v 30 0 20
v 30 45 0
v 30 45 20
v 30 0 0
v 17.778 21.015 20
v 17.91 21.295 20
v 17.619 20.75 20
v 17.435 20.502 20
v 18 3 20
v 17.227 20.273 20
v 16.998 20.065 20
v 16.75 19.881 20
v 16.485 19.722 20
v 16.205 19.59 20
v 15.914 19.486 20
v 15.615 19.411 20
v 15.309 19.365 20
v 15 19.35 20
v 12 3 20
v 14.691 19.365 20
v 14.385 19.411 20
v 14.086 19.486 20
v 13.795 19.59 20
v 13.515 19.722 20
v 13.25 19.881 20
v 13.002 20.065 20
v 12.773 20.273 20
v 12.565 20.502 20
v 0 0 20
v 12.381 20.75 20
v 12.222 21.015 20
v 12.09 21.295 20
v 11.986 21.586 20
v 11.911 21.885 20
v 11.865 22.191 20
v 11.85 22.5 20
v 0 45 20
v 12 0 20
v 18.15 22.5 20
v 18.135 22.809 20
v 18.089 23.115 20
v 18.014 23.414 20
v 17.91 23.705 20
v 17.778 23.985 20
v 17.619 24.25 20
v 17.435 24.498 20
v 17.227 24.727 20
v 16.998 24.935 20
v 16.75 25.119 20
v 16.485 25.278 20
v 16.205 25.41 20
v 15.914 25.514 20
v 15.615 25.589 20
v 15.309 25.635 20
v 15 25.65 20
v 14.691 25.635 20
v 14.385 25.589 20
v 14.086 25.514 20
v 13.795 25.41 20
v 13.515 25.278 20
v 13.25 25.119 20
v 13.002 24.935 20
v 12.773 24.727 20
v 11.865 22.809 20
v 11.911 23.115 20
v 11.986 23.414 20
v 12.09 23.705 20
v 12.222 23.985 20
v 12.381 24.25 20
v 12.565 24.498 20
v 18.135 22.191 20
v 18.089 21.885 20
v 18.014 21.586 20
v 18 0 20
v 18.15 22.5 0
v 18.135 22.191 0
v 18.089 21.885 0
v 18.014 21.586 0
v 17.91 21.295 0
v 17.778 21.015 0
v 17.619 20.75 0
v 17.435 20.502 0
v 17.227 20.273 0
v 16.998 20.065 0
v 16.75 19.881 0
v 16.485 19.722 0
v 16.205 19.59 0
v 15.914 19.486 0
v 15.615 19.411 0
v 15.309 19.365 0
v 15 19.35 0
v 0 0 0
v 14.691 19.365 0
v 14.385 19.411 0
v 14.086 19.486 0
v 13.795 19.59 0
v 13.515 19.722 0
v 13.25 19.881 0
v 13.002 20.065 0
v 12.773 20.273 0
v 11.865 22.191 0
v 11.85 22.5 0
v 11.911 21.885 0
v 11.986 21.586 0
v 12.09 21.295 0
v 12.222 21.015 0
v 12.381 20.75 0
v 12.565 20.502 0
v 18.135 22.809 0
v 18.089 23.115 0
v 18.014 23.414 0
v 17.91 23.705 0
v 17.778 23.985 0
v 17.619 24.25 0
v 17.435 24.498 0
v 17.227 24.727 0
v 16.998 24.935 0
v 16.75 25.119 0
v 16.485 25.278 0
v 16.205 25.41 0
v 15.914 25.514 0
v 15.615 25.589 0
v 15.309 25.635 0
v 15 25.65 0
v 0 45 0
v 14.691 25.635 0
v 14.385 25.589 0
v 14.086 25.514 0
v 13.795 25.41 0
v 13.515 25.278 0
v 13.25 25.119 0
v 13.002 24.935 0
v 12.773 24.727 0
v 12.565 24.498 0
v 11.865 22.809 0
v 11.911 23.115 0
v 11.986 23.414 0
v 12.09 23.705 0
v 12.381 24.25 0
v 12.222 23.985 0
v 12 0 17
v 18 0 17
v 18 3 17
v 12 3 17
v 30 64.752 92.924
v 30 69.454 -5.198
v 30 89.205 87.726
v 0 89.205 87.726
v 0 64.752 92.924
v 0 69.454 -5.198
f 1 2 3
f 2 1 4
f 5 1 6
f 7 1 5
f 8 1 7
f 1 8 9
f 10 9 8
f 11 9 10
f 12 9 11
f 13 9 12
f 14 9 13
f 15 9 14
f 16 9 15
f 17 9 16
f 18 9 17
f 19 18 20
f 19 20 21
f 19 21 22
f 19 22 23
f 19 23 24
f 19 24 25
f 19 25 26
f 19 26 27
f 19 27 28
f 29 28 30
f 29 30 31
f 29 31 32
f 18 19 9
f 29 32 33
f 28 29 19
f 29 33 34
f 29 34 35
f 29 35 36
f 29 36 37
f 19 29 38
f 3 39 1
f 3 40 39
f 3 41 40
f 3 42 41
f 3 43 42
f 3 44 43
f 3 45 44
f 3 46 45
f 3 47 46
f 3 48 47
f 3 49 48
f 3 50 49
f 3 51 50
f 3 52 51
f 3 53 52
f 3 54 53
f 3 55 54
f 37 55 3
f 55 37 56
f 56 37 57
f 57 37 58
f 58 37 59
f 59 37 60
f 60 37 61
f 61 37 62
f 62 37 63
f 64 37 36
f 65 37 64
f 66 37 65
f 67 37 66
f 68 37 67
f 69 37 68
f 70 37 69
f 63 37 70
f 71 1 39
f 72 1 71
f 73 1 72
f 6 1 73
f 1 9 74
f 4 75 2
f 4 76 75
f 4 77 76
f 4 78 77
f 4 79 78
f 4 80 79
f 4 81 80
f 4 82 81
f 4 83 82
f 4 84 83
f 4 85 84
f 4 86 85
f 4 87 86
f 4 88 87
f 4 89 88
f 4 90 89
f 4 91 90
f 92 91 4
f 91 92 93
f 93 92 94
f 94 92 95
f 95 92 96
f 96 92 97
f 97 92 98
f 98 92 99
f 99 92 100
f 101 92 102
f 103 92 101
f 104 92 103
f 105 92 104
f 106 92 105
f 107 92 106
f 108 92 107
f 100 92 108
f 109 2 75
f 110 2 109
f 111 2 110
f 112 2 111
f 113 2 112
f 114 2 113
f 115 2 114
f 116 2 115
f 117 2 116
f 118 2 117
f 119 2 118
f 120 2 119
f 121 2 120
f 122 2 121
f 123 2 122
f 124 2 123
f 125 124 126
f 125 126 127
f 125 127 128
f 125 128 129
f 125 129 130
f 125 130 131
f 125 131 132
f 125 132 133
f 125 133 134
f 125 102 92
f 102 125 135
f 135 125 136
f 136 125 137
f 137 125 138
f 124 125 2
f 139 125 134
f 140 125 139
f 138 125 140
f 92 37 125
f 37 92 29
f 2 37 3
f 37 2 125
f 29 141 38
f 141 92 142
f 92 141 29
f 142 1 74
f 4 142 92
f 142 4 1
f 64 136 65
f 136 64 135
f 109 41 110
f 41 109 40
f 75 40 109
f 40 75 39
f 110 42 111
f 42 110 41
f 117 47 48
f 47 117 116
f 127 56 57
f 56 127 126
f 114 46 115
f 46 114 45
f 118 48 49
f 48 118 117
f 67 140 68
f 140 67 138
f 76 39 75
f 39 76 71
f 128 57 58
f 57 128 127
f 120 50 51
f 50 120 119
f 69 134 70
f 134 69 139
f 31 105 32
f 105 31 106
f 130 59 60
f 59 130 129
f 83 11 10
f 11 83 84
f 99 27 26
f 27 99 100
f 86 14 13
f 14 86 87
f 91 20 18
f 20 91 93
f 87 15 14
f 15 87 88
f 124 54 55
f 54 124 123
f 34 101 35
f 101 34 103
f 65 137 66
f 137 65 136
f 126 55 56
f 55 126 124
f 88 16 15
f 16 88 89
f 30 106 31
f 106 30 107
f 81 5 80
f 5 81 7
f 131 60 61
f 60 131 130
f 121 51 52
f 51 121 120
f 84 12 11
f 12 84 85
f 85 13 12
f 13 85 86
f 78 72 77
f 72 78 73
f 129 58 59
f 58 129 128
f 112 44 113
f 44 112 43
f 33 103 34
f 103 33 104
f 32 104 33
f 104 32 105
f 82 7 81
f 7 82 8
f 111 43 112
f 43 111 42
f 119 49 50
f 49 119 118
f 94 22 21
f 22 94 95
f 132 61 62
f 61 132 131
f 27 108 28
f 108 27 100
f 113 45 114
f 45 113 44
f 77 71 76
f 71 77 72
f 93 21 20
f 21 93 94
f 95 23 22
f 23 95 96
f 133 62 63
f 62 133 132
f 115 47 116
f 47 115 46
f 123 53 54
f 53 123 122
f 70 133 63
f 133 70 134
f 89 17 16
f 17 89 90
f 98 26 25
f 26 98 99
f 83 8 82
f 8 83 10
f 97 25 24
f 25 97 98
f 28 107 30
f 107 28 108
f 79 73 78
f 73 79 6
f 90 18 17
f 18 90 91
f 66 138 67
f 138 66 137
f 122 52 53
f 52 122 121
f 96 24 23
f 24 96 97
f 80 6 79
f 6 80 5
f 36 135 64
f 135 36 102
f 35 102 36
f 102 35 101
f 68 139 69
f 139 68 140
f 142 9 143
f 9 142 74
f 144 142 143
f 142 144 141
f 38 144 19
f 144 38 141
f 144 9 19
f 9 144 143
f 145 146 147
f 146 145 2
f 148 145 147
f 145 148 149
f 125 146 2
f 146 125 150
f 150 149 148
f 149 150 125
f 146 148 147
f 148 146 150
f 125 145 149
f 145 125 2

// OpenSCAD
$fn = 64;

module ar15_grip_mount() {
    difference() {
        // Mounting block
        cube([30, 45, 20], center = false);

        // Screw hole
        translate([15, 22.5, -5])
            cylinder(h = 30, d = 6.3, center = false);

        // Anti-rotation slot
        translate([12, 0, 17])
            cube([6, 3, 10]);
    }
}

module simple_grip_body() {
    grip_width = 30;
    grip_depth = 25;
    grip_height = 95;
    grip_angle = -12;

    // Grip block, slightly slanted
    translate([0, 45, 0])  // attach to mount block bottom
    rotate([grip_angle, 0, 0])
        cube([grip_width, grip_depth, grip_height], center = false);
}

// Union grip with mount block
union() {
    ar15_grip_mount();
    simple_grip_body();
}
